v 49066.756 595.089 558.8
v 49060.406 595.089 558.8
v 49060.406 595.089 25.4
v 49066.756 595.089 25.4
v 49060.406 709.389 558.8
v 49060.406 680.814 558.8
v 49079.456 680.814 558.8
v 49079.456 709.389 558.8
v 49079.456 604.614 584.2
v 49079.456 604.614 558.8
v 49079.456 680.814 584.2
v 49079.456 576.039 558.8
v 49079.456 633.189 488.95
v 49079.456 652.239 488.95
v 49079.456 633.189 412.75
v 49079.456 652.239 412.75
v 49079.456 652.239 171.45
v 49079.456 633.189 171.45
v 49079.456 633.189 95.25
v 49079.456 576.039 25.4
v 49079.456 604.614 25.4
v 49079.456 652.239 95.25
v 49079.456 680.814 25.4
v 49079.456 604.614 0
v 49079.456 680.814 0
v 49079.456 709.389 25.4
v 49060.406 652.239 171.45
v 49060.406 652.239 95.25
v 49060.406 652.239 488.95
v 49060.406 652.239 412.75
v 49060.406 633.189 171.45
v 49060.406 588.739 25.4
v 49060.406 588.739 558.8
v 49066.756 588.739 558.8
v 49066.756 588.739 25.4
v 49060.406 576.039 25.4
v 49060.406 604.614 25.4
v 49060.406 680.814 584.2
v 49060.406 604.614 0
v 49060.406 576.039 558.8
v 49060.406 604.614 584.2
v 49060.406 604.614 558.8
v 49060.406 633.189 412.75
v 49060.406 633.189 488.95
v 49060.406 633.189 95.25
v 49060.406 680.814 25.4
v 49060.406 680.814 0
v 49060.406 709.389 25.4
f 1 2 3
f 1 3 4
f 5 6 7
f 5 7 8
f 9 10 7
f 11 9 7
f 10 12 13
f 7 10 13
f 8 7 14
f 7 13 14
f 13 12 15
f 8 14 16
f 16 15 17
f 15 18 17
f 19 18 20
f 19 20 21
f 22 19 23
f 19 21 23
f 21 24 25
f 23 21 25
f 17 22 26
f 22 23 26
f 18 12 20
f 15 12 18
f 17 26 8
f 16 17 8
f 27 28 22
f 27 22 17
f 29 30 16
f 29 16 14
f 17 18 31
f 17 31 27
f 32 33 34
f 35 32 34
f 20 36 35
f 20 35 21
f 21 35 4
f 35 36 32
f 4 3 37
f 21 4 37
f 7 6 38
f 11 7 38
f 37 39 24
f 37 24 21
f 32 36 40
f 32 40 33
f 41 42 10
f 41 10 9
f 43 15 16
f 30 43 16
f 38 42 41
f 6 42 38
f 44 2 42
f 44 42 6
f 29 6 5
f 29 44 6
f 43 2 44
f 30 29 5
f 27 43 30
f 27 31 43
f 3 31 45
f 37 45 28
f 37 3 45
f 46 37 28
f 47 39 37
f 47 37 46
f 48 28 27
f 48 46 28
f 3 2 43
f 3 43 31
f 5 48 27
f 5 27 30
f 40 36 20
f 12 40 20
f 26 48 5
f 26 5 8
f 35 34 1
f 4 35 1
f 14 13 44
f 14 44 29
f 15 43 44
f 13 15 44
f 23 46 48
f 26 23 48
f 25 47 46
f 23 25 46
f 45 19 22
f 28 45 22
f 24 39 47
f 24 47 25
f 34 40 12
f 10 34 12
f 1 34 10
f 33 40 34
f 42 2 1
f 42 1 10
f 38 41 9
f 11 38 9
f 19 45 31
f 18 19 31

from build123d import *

# Parameters (mm, degrees)
SKETCH1_W           = 19.05
SKETCH1_H           = 133.35
BOSS_EXTRUDE1_DEPTH = 584.2
SKETCH2_W           = 76.2
SKETCH2_H           = 19.05
SKETCH2_W_2         = 25.4
SKETCH2_H_2         = 28.575
CUT_EXTRUDE1_DEPTH  = 920.17672153
SKETCH3_W           = 6.35
SKETCH3_H           = 6.35
CUT_EXTRUDE2_DEPTH  = 49089.059018009


with BuildPart() as part:
    # Sketch1 → Boss-Extrude1 (new body)
    with BuildSketch(Plane.XY):
        with Locations((49069.931142185, 642.714387363)):
            Rectangle(SKETCH1_W, SKETCH1_H)
    extrude(amount=BOSS_EXTRUDE1_DEPTH)

    # Sketch2 → Cut-Extrude1 (cut, through all)
    with BuildSketch(Plane.ZY.offset(-49060.406142185)):
        with Locations((133.35, 642.714387363)):
            Rectangle(SKETCH2_W, SKETCH2_H)
        with Locations((450.85, 642.714387363)):
            Rectangle(SKETCH2_W, SKETCH2_H)
        with Locations((571.5, 695.101887363)):
            Rectangle(SKETCH2_W_2, SKETCH2_H_2)
        with Locations((12.7, 695.101887363)):
            Rectangle(SKETCH2_W_2, SKETCH2_H_2)
        with Locations((12.7, 590.326887363)):
            Rectangle(SKETCH2_W_2, SKETCH2_H_2)
        with Locations((571.5, 590.326887363)):
            Rectangle(SKETCH2_W_2, SKETCH2_H_2)
    extrude(amount=-CUT_EXTRUDE1_DEPTH, mode=Mode.SUBTRACT)

    # Sketch3 → Cut-Extrude2 (cut, through all)
    with BuildSketch(Plane.XY.offset(584.2)):
        with Locations((49063.581142185, 591.914387363)):
            Rectangle(SKETCH3_W, SKETCH3_H)
    extrude(amount=-CUT_EXTRUDE2_DEPTH, mode=Mode.SUBTRACT)


solid = part.part
